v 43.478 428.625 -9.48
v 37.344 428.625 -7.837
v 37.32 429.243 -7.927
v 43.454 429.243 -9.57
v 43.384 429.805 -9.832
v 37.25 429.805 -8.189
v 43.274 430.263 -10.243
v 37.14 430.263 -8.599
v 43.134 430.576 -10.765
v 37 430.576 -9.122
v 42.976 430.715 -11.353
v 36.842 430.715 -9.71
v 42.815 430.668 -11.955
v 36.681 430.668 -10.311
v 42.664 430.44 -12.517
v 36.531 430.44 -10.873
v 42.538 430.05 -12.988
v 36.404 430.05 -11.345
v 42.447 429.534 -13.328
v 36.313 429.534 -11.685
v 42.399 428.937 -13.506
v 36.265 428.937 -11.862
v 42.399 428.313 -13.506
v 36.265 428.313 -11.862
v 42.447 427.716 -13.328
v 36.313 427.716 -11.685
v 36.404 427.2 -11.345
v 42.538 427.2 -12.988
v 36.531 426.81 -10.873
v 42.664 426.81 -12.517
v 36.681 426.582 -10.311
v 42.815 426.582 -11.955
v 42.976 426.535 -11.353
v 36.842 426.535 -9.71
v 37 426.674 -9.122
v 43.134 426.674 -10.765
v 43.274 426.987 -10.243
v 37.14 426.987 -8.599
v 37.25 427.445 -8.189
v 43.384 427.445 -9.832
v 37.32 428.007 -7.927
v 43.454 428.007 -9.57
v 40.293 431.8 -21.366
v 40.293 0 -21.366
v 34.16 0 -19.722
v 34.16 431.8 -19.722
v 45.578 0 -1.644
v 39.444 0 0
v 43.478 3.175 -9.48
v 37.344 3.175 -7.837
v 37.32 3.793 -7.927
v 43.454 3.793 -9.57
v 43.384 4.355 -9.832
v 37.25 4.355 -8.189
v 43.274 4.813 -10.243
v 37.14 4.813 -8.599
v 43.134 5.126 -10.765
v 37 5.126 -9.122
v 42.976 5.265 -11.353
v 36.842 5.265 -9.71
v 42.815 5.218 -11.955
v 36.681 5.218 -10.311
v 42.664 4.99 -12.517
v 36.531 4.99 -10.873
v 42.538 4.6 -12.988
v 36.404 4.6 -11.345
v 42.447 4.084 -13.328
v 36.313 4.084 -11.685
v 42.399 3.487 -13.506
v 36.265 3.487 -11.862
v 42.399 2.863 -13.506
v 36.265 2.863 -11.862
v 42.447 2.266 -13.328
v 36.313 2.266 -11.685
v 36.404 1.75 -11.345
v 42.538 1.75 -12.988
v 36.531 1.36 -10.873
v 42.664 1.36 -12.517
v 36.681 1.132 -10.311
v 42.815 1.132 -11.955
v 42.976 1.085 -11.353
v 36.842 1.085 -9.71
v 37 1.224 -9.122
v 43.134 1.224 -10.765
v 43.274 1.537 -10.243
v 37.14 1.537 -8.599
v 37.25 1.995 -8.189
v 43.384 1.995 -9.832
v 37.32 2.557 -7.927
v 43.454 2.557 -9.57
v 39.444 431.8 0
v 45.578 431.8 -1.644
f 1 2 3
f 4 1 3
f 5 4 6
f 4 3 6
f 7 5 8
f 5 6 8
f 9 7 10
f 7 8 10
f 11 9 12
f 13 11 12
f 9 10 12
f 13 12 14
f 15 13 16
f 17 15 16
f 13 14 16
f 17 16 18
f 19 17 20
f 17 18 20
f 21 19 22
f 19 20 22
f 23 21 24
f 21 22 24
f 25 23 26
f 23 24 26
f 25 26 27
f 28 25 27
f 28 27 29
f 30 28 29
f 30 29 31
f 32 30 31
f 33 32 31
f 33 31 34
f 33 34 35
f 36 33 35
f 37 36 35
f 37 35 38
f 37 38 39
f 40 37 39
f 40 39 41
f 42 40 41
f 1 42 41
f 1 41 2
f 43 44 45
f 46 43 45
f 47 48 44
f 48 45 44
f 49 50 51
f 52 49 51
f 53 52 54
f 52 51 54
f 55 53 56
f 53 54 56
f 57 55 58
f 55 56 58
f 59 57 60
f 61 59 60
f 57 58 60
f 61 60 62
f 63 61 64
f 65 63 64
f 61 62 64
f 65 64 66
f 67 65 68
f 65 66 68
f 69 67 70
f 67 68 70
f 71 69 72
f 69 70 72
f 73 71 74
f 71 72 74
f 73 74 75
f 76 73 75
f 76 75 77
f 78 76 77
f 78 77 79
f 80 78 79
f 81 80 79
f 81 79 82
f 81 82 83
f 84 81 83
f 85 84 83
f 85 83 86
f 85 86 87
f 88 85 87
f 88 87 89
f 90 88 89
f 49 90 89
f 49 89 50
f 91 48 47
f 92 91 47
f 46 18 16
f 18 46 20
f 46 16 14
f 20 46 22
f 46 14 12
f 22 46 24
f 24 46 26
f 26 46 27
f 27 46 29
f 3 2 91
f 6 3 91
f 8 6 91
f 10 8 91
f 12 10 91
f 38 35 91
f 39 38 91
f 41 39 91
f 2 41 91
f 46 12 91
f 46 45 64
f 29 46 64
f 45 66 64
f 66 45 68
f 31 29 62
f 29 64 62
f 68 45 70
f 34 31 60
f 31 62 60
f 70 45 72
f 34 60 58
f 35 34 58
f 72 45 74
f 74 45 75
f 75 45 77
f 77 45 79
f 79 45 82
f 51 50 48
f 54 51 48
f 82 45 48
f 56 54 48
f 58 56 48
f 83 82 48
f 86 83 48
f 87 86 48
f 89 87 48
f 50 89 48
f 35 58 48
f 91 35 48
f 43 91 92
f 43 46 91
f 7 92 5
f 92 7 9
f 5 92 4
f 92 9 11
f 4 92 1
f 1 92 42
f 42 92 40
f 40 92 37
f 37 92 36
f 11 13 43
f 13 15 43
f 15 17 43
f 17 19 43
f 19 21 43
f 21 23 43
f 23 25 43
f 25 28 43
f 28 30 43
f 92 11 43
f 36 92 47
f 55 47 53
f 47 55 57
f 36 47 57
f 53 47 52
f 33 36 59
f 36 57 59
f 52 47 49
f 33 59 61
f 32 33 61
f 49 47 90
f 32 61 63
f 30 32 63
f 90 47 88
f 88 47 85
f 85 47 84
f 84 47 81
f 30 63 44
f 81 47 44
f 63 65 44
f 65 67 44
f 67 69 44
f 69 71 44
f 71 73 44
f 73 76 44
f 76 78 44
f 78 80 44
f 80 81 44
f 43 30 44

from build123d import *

# Parameters (mm, degrees)
BOSS_EXTRUDE1_DEPTH = 431.8
SKETCH2_R           = 2.0955
CUT_EXTRUDE1_DEPTH  = 433.042370256
SKETCH3_R           = 2.0955
CUT_EXTRUDE2_DEPTH  = 433.042370256


with BuildPart() as part:
    # Sketch1 → Boss-Extrude1 (new body)
    with BuildSketch(Plane(origin=(0, 0, 0), x_dir=(1, 0, 0), z_dir=(0, 1, 0))):
        Polygon((39.444022474, 0), (45.577651471, 1.643500936), (40.293154487, 21.365512173), (34.15952549, 19.722011237), align=None)
    extrude(amount=BOSS_EXTRUDE1_DEPTH)

    # Sketch2 → Cut-Extrude1 (cut, through all)
    with BuildSketch(Plane(origin=(36.801773982, 0, -9.861005618), x_dir=(0.25881904510252096, 0, 0.9659258262890683), z_dir=(-0.9659258262890683, 0, 0.25881904510252096))):
        with Locations((0, 428.625)):
            Circle(SKETCH2_R)
    extrude(amount=-CUT_EXTRUDE1_DEPTH, mode=Mode.SUBTRACT)

    # Sketch3 → Cut-Extrude2 (cut, through all)
    with BuildSketch(Plane(origin=(36.801773982, 0, -9.861005618), x_dir=(0.25881904510252096, 0, 0.9659258262890683), z_dir=(-0.9659258262890683, 0, 0.25881904510252096))):
        with Locations((0, 3.175)):
            Circle(SKETCH3_R)
    extrude(amount=-CUT_EXTRUDE2_DEPTH, mode=Mode.SUBTRACT)


solid = part.part
